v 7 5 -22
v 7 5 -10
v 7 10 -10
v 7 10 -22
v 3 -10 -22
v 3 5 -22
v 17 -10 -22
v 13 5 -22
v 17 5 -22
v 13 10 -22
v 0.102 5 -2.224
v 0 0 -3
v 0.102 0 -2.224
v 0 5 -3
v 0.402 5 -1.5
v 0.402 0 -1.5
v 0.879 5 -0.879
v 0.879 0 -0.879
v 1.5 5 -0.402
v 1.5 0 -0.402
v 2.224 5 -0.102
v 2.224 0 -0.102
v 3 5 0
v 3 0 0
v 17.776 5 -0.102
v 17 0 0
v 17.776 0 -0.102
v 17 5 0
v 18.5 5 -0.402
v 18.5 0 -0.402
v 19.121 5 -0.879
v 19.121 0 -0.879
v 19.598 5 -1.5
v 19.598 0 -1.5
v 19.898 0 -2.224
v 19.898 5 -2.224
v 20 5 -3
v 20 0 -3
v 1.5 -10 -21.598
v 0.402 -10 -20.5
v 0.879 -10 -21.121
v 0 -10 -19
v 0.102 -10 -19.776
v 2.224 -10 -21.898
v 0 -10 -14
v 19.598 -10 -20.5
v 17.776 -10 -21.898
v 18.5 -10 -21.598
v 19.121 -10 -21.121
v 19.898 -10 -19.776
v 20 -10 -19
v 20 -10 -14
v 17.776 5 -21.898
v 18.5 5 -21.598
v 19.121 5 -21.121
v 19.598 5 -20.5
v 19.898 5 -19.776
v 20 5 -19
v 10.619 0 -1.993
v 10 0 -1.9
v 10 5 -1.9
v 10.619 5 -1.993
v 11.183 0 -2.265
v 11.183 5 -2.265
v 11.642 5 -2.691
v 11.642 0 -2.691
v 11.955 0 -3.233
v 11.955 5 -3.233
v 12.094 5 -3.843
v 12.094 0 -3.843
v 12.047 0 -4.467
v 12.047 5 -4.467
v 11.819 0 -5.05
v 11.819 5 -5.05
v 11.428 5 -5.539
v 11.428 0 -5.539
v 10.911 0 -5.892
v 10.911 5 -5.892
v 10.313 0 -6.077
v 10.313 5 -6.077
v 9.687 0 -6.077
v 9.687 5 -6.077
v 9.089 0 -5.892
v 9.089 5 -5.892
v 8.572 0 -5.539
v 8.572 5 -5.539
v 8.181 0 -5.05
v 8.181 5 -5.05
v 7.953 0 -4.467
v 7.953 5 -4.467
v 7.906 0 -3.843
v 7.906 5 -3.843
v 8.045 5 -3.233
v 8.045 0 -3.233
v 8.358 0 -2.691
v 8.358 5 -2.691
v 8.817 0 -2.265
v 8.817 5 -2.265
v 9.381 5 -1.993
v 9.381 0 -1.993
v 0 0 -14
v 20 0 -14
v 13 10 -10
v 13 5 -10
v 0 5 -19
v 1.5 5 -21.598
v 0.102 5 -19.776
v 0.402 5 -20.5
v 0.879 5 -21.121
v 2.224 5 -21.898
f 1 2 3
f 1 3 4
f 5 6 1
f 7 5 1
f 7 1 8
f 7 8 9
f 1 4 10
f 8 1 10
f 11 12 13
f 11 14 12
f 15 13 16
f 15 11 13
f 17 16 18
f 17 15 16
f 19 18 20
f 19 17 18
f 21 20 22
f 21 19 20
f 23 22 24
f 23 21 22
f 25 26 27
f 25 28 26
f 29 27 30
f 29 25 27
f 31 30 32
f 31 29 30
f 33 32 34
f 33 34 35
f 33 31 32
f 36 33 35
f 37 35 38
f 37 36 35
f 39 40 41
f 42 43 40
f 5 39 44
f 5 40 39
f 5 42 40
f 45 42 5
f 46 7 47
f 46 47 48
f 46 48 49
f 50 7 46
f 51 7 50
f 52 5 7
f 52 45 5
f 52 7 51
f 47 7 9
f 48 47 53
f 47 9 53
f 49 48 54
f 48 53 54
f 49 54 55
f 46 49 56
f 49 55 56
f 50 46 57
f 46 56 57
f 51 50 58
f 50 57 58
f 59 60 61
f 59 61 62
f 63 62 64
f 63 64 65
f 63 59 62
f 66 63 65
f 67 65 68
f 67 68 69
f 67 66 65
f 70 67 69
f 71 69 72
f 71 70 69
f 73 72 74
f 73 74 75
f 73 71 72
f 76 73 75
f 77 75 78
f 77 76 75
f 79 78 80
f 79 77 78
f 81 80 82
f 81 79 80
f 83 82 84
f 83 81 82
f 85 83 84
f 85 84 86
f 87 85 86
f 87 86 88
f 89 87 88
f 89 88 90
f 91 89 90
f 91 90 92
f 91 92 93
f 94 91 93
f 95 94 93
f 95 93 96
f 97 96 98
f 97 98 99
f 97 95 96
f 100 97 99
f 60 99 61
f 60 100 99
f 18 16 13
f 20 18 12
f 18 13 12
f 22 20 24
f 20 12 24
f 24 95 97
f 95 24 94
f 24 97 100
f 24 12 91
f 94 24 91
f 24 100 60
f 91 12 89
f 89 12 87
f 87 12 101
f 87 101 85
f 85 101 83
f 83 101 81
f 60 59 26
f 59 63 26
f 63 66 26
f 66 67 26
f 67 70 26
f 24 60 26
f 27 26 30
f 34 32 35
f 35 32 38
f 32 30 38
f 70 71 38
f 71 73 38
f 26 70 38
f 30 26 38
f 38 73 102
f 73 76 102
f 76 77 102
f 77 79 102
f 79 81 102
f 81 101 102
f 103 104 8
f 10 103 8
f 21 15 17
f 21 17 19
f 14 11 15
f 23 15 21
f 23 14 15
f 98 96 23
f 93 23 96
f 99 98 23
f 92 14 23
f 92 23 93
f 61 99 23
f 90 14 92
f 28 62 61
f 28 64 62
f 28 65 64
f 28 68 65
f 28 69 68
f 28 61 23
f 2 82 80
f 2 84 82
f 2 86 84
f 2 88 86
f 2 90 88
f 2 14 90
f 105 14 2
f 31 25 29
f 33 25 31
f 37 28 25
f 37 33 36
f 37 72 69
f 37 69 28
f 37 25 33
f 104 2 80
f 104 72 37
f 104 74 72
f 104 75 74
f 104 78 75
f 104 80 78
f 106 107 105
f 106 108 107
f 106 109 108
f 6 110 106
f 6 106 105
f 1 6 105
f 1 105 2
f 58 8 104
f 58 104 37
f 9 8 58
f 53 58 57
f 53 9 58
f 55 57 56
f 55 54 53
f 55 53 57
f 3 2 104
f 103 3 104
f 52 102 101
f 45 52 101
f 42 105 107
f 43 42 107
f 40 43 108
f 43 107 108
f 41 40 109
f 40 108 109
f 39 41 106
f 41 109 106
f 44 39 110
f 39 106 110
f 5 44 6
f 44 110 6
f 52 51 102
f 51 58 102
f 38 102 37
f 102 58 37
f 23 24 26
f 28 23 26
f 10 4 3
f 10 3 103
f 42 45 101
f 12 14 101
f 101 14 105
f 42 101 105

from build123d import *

# Parameters (mm, degrees)
SKETCH_1_R      = 2.1
EXTRUDE_1_DEPTH = 5
EXTRUDE_START   = 5
SKETCH_1_3_W    = 6
SKETCH_1_3_H    = 12
EXTRUDE_2_DEPTH = 5
FILLET_2_R      = 3
EXTRUDE_3_DEPTH = 10


with BuildPart() as part:
    # 草图1 → 凸台-拉伸1 (new body)
    # profile 1 of 10: a face of its own
    with BuildSketch(Plane(origin=(0, 0, 0), x_dir=(1, 0, 0), z_dir=(0, 1, 0))):
        with BuildLine():
            Line((0, 22), (0, 0))
            Line((0, 0), (20, 0))
            Line((20, 0), (20, 22))
            Line((20, 22), (13, 22))
            Line((13, 22), (13, 17.968245837))
            ThreePointArc((13, 17.968245837), (13.862372436, 17.790569415), (14.25, 17))
            ThreePointArc((14.25, 17), (13.862372436, 16.209430585), (13, 16.031754163))
            Line((13, 16.031754163), (13, 10))
            Line((13, 10), (7, 10))
            Line((7, 10), (7, 16.031754163))
            ThreePointArc((7, 16.031754163), (5.75, 17), (7, 17.968245837))
            Line((7, 17.968245837), (7, 22))
            Line((7, 22), (0, 22))
        make_face()
        with Locations(Location((10, 4, 0), (0, 0, 270))):
            Circle(SKETCH_1_R, mode=Mode.SUBTRACT)
    # profile 2 of 10: a face of its own
    with BuildSketch(Plane(origin=(0, 0, 0), x_dir=(1, 0, 0), z_dir=(0, 1, 0))):
        with BuildLine():
            Line((13, 22), (7, 22))
            Line((7, 22), (7, 17.968245837))
            ThreePointArc((7, 17.968245837), (7.540569415, 17.612372436), (7.75, 17))
            ThreePointArc((7.75, 17), (7.540569415, 16.387627564), (7, 16.031754163))
            Line((7, 16.031754163), (7, 10))
            Line((7, 10), (13, 10))
            Line((13, 10), (13, 16.031754163))
            ThreePointArc((13, 16.031754163), (12.25, 17), (13, 17.968245837))
            Line((13, 17.968245837), (13, 22))
        make_face()
    # profile 3 of 10: a face of its own
    with BuildSketch(Plane(origin=(0, 0, 0), x_dir=(1, 0, 0), z_dir=(0, 1, 0))):
        with BuildLine():
            ThreePointArc((14.25, 17), (13.862372436, 17.790569415), (13, 17.968245837))
            Line((13, 17.968245837), (13, 16.031754163))
            ThreePointArc((13, 16.031754163), (13.862372436, 16.209430585), (14.25, 17))
        make_face()
    # profile 4 of 10: a face of its own
    with BuildSketch(Plane(origin=(0, 0, 0), x_dir=(1, 0, 0), z_dir=(0, 1, 0))):
        with BuildLine():
            Line((13, 16.031754163), (13, 17.968245837))
            ThreePointArc((13, 17.968245837), (12.25, 17), (13, 16.031754163))
        make_face()
    # profile 5 of 10: a face of its own
    with BuildSketch(Plane(origin=(0, 0, 0), x_dir=(1, 0, 0), z_dir=(0, 1, 0))):
        with BuildLine():
            ThreePointArc((14.25, 17), (13.862372436, 17.790569415), (13, 17.968245837))
            Line((13, 17.968245837), (13, 16.031754163))
            ThreePointArc((13, 16.031754163), (13.862372436, 16.209430585), (14.25, 17))
        make_face()
    # profile 6 of 10: a face of its own
    with BuildSketch(Plane(origin=(0, 0, 0), x_dir=(1, 0, 0), z_dir=(0, 1, 0))):
        with BuildLine():
            Line((13, 16.031754163), (13, 17.968245837))
            ThreePointArc((13, 17.968245837), (12.25, 17), (13, 16.031754163))
        make_face()
    # profile 7 of 10: a face of its own
    with BuildSketch(Plane(origin=(0, 0, 0), x_dir=(1, 0, 0), z_dir=(0, 1, 0))):
        with BuildLine():
            ThreePointArc((7.75, 17), (7.540569415, 17.612372436), (7, 17.968245837))
            Line((7, 17.968245837), (7, 16.031754163))
            ThreePointArc((7, 16.031754163), (7.540569415, 16.387627564), (7.75, 17))
        make_face()
    # profile 8 of 10: a face of its own
    with BuildSketch(Plane(origin=(0, 0, 0), x_dir=(1, 0, 0), z_dir=(0, 1, 0))):
        with BuildLine():
            Line((7, 16.031754163), (7, 17.968245837))
            ThreePointArc((7, 17.968245837), (5.75, 17), (7, 16.031754163))
        make_face()
    # profile 9 of 10: a face of its own
    with BuildSketch(Plane(origin=(0, 0, 0), x_dir=(1, 0, 0), z_dir=(0, 1, 0))):
        with BuildLine():
            ThreePointArc((7.75, 17), (7.540569415, 17.612372436), (7, 17.968245837))
            Line((7, 17.968245837), (7, 16.031754163))
            ThreePointArc((7, 16.031754163), (7.540569415, 16.387627564), (7.75, 17))
        make_face()
    # profile 10 of 10: a face of its own
    with BuildSketch(Plane(origin=(0, 0, 0), x_dir=(1, 0, 0), z_dir=(0, 1, 0))):
        with BuildLine():
            Line((7, 16.031754163), (7, 17.968245837))
            ThreePointArc((7, 17.968245837), (5.75, 17), (7, 16.031754163))
        make_face()
    extrude(amount=EXTRUDE_1_DEPTH)

    # 草图1<3> → 凸台-拉伸2 (add)
    with BuildSketch(Plane(origin=(0, 0, 0), x_dir=(1, 0, 0), z_dir=(0, 1, 0)).offset(EXTRUDE_START)):
        with Locations((10, 16)):
            Rectangle(SKETCH_1_3_W, SKETCH_1_3_H)
    extrude(amount=EXTRUDE_2_DEPTH)

    # 圆角2
    fillet_2_edges = [part.edges().sort_by_distance(p)[0] for p in [
        (20, 2.5, 0),
        (0, 2.5, 0),
        (0, 2.5, -22),
        (20, 2.5, -22),
    ]]
    fillet(fillet_2_edges, radius=FILLET_2_R)

    # 草图2 → 凸台-拉伸3 (add)
    with BuildSketch(Plane.XZ):
        with BuildLine():
            Line((3, -22), (17, -22))
            ThreePointArc((17, -22), (19.121320344, -21.121320344), (20, -19))
            Line((20, -19), (20, -14))
            Line((20, -14), (0, -14))
            Line((0, -14), (0, -19))
            ThreePointArc((0, -19), (0.878679656, -21.121320344), (3, -22))
        make_face()
    extrude(amount=EXTRUDE_3_DEPTH)


solid = part.part
